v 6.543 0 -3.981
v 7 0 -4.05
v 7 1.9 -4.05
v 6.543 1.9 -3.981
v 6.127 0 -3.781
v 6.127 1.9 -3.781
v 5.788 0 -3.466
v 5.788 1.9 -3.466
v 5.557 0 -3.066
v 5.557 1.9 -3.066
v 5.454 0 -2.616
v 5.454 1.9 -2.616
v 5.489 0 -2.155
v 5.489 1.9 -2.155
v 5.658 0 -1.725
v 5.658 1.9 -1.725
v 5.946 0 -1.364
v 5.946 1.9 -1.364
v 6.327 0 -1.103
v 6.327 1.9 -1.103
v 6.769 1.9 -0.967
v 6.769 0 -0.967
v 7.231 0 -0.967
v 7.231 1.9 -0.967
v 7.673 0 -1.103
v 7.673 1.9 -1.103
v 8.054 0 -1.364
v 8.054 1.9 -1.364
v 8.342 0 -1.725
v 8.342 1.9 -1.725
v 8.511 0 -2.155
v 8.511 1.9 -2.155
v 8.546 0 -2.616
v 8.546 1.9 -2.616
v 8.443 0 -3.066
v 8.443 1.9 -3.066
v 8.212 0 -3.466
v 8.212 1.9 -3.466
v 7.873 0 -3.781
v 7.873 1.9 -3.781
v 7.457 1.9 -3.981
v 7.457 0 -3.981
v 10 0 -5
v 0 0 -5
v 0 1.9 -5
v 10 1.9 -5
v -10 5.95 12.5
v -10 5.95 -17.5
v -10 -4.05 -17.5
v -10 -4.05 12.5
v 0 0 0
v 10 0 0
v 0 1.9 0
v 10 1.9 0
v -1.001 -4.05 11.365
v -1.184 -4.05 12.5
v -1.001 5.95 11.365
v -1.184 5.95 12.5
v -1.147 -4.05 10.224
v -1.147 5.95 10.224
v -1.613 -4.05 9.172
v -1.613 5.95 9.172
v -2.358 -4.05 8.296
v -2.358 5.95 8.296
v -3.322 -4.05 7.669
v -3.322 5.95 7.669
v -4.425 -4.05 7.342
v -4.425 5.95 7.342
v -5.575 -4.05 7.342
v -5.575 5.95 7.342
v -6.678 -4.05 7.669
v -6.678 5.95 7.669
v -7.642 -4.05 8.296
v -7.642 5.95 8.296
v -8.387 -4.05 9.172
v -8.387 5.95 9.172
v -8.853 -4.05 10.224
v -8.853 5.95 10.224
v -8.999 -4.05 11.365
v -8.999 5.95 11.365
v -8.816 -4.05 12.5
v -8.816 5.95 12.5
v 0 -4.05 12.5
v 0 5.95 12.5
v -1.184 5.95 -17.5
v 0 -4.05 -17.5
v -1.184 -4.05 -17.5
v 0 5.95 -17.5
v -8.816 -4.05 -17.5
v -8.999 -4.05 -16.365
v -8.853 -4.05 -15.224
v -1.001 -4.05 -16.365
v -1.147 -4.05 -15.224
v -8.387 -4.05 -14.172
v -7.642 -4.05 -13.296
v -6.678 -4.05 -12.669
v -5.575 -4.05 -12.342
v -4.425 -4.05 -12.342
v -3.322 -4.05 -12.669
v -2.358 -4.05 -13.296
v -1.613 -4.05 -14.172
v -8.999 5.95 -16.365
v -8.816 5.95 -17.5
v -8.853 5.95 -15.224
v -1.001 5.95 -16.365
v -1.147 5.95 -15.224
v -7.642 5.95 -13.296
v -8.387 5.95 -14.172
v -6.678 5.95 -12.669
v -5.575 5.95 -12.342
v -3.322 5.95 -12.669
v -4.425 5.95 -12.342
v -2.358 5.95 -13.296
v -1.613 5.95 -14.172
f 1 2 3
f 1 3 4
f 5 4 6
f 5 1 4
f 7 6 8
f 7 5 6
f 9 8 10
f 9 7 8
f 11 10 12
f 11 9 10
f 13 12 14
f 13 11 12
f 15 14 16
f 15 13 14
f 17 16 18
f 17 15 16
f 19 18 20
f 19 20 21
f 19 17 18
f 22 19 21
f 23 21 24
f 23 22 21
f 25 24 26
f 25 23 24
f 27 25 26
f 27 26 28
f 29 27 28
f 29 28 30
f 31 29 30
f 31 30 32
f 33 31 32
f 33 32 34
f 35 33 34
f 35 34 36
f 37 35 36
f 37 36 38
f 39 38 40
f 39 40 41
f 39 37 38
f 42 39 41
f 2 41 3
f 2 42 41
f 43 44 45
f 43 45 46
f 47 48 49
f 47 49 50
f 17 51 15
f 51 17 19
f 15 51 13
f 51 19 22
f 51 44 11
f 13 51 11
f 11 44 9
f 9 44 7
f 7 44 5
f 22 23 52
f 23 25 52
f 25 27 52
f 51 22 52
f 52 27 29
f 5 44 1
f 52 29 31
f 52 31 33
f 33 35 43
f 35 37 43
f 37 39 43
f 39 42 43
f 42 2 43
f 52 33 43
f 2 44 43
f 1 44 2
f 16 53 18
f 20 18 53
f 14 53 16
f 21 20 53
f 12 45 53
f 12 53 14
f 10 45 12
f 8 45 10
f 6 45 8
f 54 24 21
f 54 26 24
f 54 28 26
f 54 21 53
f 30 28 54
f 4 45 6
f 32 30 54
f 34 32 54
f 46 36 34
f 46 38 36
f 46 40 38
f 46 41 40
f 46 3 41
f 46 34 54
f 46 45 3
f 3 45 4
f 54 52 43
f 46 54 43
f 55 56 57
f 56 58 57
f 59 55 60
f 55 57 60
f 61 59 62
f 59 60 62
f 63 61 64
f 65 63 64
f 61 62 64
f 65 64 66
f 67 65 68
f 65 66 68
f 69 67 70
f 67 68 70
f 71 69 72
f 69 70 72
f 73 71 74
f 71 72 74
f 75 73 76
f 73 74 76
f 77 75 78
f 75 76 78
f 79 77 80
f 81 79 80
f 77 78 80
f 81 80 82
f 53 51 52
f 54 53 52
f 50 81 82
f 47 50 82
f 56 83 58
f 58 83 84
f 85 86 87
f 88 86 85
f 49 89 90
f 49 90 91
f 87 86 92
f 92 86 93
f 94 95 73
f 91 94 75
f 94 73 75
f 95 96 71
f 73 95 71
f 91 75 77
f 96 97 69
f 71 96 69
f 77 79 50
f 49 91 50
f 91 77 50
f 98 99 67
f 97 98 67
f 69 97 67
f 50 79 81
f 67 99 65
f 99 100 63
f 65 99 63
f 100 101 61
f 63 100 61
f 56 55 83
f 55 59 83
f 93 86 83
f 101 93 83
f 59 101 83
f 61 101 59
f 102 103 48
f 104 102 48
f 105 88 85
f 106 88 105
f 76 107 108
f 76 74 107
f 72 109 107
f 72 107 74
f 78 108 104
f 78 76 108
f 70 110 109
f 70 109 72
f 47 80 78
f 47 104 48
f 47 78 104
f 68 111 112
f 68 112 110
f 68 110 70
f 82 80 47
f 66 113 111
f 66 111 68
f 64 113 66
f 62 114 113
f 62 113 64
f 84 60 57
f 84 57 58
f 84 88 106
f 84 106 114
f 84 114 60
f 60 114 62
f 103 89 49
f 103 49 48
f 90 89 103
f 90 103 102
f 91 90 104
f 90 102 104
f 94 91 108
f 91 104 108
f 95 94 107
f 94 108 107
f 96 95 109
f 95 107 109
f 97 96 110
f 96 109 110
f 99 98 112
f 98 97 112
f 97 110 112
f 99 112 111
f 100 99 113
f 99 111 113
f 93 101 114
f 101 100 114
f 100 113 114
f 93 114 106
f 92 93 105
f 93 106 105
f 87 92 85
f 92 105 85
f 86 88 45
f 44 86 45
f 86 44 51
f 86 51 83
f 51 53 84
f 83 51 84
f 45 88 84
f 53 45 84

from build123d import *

# Parameters (mm, degrees)
SKETCH_1_W          = 10
SKETCH_1_H          = 5
SKETCH_1_R          = 1.55
EXTRUDE_1_DEPTH     = 1.9
SKETCH_2_W          = 30
SKETCH_2_H          = 10
EXTRUDE_2_DEPTH     = 10
SKETCH_3_R          = 4
CUT_EXTRUDE_1_DEPTH = 10


with BuildPart() as part:
    # 草图1 → 凸台-拉伸1 (new body)
    with BuildSketch(Plane(origin=(0, 0, 0), x_dir=(1, 0, 0), z_dir=(0, 1, 0))):
        with Locations((5, 2.5)):
            Rectangle(SKETCH_1_W, SKETCH_1_H)
        with Locations(Location((7, 2.5, 0), (0, 0, 90))):
            Circle(SKETCH_1_R, mode=Mode.SUBTRACT)
    extrude(amount=EXTRUDE_1_DEPTH)

    # 草图2 → 凸台-拉伸2 (add)
    with BuildSketch(Plane.ZY):
        with Locations((-2.5, 0.95)):
            Rectangle(SKETCH_2_W, SKETCH_2_H)
    extrude(amount=EXTRUDE_2_DEPTH)

    # 草图3 → 切除-拉伸1 (cut)
    with BuildSketch(Plane(origin=(0, 5.95, 0), x_dir=(1, 0, 0), z_dir=(0, 1, 0))):
        with Locations((-5, 16.3)):
            Circle(SKETCH_3_R)
        with Locations((-5, -11.3)):
            Circle(SKETCH_3_R)
    extrude(amount=-CUT_EXTRUDE_1_DEPTH, mode=Mode.SUBTRACT)


solid = part.part
